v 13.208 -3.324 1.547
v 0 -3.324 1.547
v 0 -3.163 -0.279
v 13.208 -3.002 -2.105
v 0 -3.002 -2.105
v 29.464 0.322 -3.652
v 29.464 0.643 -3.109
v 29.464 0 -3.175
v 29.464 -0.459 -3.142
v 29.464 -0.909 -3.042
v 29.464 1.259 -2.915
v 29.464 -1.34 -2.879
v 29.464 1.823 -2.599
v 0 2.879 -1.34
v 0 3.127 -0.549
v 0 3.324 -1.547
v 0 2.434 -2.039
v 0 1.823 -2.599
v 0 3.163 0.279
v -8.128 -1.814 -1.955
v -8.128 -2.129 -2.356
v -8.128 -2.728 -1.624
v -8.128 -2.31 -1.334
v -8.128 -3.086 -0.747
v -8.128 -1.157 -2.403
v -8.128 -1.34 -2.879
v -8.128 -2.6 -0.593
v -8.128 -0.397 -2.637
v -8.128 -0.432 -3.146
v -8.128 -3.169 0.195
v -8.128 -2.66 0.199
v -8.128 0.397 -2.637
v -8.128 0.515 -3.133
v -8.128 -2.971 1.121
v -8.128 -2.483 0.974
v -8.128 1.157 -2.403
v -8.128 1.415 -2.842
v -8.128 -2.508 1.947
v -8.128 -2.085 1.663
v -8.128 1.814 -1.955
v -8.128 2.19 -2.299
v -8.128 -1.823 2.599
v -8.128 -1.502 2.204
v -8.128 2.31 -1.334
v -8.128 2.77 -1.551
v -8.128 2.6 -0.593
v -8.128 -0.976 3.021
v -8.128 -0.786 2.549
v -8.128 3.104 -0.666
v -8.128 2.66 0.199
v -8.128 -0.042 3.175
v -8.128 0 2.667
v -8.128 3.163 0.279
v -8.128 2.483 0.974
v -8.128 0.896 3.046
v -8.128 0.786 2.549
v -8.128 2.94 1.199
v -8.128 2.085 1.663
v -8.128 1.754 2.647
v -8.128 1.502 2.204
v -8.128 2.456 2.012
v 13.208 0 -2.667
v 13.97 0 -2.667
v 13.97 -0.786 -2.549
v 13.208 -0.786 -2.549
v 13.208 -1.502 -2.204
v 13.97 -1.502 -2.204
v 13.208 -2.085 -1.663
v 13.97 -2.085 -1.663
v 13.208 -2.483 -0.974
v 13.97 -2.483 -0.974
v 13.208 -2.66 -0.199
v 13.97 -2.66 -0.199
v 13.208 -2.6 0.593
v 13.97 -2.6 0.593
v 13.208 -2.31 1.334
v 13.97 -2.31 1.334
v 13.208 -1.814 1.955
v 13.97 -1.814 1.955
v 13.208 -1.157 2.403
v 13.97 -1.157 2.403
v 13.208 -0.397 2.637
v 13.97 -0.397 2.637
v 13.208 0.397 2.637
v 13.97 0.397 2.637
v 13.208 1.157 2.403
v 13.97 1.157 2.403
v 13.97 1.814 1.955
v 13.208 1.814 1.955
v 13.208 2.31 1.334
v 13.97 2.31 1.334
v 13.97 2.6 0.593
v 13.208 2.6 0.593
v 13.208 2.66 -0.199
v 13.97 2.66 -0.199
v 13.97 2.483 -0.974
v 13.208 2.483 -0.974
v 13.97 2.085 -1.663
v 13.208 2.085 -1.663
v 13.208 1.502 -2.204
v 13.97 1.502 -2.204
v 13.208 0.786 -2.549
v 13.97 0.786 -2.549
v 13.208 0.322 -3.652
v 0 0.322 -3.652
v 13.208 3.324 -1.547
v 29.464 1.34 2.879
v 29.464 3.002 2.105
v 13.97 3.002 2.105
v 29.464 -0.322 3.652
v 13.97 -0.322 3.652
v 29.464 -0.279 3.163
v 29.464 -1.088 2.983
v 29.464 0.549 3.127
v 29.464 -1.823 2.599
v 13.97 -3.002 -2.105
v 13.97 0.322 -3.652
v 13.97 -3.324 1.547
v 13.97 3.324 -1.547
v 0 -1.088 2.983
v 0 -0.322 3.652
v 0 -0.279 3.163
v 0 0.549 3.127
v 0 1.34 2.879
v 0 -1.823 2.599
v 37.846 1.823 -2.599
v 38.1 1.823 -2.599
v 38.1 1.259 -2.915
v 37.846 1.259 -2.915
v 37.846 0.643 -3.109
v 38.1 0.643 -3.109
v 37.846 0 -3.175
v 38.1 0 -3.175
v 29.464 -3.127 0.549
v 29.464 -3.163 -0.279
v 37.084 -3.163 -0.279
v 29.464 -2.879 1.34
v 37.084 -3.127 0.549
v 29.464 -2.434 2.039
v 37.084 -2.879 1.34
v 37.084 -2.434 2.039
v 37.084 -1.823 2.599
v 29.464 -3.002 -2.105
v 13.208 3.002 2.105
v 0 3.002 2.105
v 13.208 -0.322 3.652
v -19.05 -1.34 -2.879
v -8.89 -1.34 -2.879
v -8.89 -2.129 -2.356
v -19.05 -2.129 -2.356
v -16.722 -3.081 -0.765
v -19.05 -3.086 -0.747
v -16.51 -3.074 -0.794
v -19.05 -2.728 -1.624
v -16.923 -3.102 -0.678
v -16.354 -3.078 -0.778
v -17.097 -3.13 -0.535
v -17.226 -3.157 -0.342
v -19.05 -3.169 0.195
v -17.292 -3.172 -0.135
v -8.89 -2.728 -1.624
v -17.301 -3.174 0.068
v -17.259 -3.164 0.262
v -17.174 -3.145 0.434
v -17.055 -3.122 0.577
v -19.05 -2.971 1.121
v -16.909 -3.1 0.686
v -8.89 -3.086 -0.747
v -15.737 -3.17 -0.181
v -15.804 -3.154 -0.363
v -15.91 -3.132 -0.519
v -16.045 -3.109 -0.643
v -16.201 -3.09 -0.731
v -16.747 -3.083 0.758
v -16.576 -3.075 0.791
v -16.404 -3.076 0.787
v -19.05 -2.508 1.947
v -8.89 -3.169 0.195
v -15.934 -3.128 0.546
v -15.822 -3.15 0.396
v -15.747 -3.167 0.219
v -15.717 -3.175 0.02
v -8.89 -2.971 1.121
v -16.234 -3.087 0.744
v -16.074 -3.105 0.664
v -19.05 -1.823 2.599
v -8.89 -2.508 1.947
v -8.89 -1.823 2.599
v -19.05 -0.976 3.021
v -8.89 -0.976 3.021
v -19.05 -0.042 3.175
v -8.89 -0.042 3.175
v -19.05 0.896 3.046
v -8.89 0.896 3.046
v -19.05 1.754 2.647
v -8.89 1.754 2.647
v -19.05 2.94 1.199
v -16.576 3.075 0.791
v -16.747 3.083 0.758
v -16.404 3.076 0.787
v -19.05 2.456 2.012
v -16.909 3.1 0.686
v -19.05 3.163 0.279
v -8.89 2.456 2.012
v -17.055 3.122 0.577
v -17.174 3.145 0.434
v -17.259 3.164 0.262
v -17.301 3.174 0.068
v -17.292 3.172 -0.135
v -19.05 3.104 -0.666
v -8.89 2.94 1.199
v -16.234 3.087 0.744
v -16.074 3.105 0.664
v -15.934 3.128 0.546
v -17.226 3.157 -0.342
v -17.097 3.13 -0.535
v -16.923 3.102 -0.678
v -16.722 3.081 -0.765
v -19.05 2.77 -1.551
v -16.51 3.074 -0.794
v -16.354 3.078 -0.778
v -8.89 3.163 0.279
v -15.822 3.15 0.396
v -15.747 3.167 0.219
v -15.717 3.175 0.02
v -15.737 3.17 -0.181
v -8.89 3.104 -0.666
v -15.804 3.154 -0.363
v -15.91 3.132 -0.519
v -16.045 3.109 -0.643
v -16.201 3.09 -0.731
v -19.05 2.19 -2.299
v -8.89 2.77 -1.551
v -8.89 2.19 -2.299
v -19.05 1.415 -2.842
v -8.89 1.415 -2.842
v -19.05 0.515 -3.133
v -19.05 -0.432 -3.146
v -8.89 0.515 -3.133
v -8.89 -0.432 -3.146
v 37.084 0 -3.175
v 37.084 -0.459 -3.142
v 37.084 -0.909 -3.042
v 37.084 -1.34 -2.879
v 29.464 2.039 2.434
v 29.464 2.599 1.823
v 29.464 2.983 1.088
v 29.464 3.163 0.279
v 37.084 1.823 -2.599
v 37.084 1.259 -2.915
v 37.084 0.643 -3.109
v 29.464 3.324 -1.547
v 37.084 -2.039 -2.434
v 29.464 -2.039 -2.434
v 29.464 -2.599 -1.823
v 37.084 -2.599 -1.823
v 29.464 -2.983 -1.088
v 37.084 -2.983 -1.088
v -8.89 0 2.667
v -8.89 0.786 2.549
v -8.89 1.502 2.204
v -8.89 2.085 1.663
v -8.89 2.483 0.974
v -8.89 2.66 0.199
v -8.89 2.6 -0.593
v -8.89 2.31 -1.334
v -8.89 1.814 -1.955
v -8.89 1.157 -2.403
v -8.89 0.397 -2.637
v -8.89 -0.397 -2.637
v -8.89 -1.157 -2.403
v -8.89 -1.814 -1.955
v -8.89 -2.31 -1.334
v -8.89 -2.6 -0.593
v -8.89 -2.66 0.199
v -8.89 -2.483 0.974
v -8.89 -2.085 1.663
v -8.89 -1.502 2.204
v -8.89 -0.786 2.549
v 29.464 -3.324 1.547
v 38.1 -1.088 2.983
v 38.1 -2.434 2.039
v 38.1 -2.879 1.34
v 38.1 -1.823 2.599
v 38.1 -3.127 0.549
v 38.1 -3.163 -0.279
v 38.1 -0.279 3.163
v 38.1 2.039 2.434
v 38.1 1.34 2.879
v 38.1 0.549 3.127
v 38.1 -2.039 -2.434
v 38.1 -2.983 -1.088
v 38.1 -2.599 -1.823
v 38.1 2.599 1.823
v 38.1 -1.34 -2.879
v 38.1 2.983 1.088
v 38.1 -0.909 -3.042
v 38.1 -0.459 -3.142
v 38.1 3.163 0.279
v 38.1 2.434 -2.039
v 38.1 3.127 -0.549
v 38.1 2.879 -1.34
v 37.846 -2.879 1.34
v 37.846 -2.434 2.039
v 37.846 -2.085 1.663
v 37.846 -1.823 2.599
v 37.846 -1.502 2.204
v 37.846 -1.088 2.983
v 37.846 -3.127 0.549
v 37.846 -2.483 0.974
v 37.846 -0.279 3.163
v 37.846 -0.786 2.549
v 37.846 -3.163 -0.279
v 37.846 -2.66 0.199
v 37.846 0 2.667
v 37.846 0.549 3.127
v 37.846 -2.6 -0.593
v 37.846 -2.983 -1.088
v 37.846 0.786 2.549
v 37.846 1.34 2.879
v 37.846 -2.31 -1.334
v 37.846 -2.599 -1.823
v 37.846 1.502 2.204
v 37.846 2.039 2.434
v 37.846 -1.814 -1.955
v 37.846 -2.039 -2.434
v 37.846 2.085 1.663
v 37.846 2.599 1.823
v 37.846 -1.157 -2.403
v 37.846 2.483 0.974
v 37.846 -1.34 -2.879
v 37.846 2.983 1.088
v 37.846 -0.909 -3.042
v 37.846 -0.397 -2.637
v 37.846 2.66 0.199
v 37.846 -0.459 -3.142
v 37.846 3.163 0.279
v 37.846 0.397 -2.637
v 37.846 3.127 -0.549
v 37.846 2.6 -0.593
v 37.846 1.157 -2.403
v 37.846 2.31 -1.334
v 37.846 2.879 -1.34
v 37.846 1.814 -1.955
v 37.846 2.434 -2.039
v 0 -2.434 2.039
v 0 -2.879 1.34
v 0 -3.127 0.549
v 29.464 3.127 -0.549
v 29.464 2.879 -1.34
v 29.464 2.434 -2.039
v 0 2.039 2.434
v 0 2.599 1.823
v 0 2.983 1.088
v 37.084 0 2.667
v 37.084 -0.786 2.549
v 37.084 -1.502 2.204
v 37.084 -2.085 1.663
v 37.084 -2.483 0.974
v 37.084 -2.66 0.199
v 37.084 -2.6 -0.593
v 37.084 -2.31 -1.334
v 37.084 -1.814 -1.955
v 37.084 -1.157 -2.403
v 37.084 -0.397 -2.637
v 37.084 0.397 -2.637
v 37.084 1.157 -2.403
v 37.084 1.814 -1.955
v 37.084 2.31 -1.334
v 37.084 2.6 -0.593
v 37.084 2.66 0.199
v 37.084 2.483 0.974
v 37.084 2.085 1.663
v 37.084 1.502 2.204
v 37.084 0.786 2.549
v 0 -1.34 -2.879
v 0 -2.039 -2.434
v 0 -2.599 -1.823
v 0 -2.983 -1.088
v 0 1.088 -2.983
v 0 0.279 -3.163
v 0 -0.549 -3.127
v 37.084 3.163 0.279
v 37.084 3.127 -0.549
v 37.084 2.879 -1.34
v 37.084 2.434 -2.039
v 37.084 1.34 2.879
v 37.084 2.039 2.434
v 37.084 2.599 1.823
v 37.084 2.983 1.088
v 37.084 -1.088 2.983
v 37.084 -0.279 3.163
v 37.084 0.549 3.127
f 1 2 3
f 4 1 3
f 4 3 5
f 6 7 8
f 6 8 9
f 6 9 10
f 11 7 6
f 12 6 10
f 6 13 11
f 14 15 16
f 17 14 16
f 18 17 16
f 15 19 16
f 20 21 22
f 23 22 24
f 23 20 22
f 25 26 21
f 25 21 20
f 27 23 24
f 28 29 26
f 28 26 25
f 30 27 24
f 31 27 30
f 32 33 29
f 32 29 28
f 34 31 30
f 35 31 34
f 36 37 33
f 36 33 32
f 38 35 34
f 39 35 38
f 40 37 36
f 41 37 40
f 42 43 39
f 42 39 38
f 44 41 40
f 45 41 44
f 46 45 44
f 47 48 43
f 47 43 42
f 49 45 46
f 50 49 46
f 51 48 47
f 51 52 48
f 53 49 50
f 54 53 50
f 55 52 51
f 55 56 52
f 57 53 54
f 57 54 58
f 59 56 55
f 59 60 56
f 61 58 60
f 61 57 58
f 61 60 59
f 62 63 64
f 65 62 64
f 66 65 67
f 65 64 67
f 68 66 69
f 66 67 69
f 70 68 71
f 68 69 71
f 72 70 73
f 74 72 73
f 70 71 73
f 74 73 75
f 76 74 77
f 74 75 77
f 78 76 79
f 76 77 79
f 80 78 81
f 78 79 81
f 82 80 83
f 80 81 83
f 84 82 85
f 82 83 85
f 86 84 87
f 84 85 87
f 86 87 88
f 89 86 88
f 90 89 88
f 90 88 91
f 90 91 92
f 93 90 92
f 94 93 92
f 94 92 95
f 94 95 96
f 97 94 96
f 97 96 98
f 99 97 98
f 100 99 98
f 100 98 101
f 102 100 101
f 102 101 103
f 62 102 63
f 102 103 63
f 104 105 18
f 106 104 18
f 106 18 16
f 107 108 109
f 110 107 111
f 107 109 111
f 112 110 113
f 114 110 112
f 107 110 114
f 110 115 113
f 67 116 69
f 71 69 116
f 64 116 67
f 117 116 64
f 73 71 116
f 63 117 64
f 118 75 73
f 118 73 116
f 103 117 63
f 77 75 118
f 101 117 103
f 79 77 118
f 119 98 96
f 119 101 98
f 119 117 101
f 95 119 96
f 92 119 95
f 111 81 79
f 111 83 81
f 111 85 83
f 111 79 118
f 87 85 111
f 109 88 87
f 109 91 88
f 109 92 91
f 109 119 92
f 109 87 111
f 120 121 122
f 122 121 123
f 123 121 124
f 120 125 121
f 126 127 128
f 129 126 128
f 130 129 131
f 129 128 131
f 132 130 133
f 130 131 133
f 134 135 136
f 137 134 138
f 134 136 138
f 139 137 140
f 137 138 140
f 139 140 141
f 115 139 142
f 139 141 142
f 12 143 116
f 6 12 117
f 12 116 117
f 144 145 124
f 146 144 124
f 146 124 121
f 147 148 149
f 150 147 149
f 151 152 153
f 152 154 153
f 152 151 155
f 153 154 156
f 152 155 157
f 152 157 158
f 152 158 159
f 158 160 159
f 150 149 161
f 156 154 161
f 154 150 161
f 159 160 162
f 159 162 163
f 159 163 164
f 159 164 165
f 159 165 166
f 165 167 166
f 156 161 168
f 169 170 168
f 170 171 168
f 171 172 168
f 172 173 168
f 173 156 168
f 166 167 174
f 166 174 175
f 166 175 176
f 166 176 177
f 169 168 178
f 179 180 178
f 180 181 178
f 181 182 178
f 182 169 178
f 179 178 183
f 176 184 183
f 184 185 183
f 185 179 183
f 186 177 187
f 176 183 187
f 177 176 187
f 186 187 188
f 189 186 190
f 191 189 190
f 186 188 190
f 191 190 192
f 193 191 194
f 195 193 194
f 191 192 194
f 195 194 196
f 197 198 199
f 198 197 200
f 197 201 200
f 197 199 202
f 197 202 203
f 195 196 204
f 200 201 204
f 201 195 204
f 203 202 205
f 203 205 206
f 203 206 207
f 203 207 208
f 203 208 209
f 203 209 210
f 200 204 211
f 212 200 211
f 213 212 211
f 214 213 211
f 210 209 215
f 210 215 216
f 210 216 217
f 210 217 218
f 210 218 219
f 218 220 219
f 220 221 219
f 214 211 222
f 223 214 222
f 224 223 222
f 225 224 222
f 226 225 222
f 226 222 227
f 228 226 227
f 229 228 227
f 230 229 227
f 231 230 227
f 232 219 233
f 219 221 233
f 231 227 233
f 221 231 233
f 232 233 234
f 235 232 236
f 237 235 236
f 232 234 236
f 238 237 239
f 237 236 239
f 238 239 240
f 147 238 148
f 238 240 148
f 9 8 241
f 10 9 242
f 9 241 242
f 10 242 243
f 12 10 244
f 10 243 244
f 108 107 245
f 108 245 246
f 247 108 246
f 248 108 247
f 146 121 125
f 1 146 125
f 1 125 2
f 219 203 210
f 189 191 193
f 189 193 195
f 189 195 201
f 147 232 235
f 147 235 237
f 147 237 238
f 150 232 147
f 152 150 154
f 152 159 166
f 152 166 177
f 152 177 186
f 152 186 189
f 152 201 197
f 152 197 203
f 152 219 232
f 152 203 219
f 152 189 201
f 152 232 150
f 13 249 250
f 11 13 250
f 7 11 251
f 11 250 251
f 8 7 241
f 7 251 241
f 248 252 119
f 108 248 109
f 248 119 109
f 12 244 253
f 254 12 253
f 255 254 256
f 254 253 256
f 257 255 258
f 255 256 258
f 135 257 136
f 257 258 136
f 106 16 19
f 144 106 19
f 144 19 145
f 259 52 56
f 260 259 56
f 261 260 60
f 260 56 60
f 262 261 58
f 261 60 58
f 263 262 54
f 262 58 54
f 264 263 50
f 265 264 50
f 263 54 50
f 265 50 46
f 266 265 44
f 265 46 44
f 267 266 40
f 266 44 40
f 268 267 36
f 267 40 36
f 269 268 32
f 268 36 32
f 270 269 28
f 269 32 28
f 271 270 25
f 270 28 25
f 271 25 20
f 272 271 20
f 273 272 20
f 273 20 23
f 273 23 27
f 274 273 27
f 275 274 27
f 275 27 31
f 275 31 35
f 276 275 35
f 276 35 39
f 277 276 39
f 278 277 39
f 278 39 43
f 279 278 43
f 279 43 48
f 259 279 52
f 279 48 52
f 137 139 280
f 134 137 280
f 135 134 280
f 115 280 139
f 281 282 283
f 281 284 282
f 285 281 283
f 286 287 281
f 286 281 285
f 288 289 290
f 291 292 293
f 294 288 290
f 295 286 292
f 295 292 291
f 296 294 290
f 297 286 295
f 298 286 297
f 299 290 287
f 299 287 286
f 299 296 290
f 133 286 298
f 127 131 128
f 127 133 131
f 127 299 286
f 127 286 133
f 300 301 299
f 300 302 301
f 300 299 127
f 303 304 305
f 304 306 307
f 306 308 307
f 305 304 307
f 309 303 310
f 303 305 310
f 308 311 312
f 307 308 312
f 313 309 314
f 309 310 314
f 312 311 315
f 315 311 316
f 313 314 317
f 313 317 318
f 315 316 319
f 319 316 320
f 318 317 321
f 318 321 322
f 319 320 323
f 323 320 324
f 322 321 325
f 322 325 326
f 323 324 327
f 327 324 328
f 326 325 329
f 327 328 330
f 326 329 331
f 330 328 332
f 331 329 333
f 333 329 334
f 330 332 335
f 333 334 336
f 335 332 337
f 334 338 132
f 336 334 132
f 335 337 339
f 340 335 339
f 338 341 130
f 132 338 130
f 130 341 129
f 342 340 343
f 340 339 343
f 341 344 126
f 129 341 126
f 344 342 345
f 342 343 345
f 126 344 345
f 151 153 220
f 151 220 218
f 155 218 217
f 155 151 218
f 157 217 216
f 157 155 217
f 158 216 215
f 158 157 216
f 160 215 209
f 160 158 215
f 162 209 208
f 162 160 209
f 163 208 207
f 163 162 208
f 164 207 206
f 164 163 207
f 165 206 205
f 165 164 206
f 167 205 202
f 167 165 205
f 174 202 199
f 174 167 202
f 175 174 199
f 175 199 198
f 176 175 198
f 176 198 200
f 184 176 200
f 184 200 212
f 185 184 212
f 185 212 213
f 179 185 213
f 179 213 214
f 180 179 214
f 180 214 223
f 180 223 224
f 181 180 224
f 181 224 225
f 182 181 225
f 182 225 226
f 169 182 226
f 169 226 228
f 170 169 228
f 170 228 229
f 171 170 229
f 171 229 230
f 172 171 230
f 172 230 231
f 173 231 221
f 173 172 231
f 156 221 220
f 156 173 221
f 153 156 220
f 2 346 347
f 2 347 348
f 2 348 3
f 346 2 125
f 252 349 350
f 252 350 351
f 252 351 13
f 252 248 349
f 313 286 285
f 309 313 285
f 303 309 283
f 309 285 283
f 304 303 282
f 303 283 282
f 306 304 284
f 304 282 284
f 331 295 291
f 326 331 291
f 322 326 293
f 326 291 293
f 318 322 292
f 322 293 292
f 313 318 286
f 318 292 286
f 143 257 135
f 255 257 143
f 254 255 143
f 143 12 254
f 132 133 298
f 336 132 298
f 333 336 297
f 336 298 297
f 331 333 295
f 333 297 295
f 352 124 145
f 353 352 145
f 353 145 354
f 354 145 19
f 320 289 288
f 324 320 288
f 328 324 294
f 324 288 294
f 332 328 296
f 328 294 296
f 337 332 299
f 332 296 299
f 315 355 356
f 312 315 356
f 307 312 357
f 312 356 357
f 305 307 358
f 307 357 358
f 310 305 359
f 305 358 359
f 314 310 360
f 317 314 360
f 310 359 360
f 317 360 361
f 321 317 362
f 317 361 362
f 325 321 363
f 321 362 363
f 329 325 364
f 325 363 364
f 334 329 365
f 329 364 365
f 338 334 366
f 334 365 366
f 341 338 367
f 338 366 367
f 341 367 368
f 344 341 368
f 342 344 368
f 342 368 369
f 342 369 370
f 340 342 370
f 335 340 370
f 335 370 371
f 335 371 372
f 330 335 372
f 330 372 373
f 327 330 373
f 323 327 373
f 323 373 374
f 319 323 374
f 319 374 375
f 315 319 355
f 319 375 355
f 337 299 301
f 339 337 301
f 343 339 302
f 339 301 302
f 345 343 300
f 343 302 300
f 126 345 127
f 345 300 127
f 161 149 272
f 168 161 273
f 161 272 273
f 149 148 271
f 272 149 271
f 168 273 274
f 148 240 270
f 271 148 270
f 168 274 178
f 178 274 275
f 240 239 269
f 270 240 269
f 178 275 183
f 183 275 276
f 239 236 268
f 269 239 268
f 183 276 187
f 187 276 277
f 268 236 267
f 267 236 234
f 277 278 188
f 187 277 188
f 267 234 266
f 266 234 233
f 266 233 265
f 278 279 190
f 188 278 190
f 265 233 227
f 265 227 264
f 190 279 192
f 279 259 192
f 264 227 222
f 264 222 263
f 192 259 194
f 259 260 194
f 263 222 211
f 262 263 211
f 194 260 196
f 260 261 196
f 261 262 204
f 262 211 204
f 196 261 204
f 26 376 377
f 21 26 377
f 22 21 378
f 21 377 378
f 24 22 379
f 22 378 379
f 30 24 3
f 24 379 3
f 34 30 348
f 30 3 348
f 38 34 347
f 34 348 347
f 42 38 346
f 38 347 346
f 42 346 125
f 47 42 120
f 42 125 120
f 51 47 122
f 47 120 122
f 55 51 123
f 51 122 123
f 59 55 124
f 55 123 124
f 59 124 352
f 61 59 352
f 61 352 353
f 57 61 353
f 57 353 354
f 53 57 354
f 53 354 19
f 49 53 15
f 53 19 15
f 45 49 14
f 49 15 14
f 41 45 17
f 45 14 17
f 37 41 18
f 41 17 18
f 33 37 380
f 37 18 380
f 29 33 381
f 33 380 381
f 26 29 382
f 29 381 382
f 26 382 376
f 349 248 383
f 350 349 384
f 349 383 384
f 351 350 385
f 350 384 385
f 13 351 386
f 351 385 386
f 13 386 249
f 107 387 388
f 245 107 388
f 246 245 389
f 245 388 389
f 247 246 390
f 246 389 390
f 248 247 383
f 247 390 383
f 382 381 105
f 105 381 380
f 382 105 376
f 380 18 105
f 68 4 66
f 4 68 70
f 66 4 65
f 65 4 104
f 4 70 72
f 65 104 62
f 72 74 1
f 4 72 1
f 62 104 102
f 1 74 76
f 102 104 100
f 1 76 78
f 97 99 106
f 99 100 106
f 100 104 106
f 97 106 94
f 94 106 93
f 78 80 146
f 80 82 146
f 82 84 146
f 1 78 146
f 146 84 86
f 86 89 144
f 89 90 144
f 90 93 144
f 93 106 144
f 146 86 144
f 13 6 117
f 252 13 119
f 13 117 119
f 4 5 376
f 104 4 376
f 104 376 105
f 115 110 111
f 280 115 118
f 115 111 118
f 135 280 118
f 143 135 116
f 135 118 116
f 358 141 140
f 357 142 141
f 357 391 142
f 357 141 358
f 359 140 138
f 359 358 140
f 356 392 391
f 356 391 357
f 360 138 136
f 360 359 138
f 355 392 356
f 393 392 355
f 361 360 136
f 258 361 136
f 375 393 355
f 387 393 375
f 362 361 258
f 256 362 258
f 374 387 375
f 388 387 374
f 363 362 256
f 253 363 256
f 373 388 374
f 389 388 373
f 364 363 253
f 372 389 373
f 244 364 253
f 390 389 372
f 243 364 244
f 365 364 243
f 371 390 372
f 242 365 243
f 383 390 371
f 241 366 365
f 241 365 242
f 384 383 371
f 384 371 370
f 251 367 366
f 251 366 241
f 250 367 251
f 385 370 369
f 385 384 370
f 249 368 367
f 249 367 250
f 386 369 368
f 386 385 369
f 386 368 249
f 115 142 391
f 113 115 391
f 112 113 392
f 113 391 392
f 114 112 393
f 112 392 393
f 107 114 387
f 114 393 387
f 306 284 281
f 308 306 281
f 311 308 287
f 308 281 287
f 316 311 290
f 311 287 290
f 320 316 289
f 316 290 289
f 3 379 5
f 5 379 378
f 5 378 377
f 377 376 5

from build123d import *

# Parameters (mm, degrees)
BOSS_EXTRUDE1_DEPTH     = 38.1
SKETCH3_R               = 3.175
BOSS_EXTRUDE3_DEPTH     = 19.05
CUT_EXTRUDE1_DEPTH      = 39.418677326
CUT_EXTRUDE1_DEPTH_BACK = 39.418677326
SKETCH4_R               = 0.79375
CUT_EXTRUDE4_DEPTH      = 8.636
SKETCH6_OUTSIDE_W       = 20.904
SKETCH6_OUTSIDE_H       = 20.248
SKETCH6_OUTSIDE_R       = 2.667
CUT_EXTRUDE5_DEPTH      = 0.762
SKETCH9_OUTSIDE_W       = 20.904
SKETCH9_OUTSIDE_H       = 20.248
SKETCH9_OUTSIDE_R       = 2.667
CUT_EXTRUDE6_DEPTH      = 0.762
SKETCH10_OUTSIDE_W      = 20.904
SKETCH10_OUTSIDE_H      = 20.248
SKETCH10_OUTSIDE_R      = 2.667
CUT_EXTRUDE7_DEPTH      = 0.762


with BuildPart() as part:
    # Sketch1 → Boss-Extrude1 (new body)
    with BuildSketch(Plane(origin=(0, 0, 0), x_dir=(0, 0, -1), z_dir=(1, 0, 0))):
        Polygon((2.105028301, -3.00161443), (3.651988499, 0.32220077), (1.546960198, 3.323815199), (-2.105028301, 3.00161443), (-3.651988499, -0.32220077), (-1.546960198, -3.323815199), align=None)
    extrude(amount=BOSS_EXTRUDE1_DEPTH)

    # Sketch3 → Boss-Extrude3 (add)
    with BuildSketch(Plane.ZY):
        with Locations(Location((0, 0, 0), (0, 0, 204.958070598))):
            Circle(SKETCH3_R)
    extrude(amount=BOSS_EXTRUDE3_DEPTH)

    # Sketch4 → Cut-Extrude1 (cut, two sides: drawn at the far end of the back side and taken through both)
    with BuildSketch(Plane(origin=(0, 0, 0), x_dir=(1, 0, 0), z_dir=(0, 1, 0)).offset(-CUT_EXTRUDE1_DEPTH_BACK)):
        with Locations(Location((-16.51, 0, 0), (0, 0, 90))):
            Circle(SKETCH4_R)
    extrude(amount=CUT_EXTRUDE1_DEPTH + CUT_EXTRUDE1_DEPTH_BACK, mode=Mode.SUBTRACT)

    # Sketch5 → Cut-Extrude4 (cut)
    with BuildSketch(Plane(origin=(38.1, 0, 0), x_dir=(0, 0, -1), z_dir=(1, 0, 0))):
        with BuildLine():
            Line((-2.878508392, 1.339706848), (-2.105028301, 3.00161443))
            ThreePointArc((-2.105028301, 3.00161443), (-3.323815199, 1.546960198), (-3.651988499, -0.32220077))
            Line((-3.651988499, -0.32220077), (-2.878508392, 1.339706848))
        make_face()
        with BuildLine():
            Line((-2.878508392, 1.339706848), (-3.651988499, -0.32220077))
            Line((-3.651988499, -0.32220077), (-2.599474334, -1.823008005))
            ThreePointArc((-2.599474334, -1.823008005), (-3.162714814, -0.279034054), (-2.878508392, 1.339706848))
        make_face()
        with BuildLine():
            ThreePointArc((-3.651988499, -0.32220077), (-3.00161443, -2.105028301), (-1.546960198, -3.323815199))
            Line((-1.546960198, -3.323815199), (-2.599474334, -1.823008005))
            Line((-2.599474334, -1.823008005), (-3.651988499, -0.32220077))
        make_face()
        with BuildLine():
            Line((-2.599474334, -1.823008005), (-1.546960198, -3.323815199))
            Line((-1.546960198, -3.323815199), (0.279034067, -3.162714813))
            ThreePointArc((0.279034067, -3.162714813), (-1.339706811, -2.878508409), (-2.599474334, -1.823008005))
        make_face()
        with BuildLine():
            ThreePointArc((-1.546960198, -3.323815199), (0.32220077, -3.651988499), (2.105028301, -3.00161443))
            Line((2.105028301, -3.00161443), (0.279034067, -3.162714813))
            Line((0.279034067, -3.162714813), (-1.546960198, -3.323815199))
        make_face()
        with BuildLine():
            Line((0.279034067, -3.162714813), (2.105028301, -3.00161443))
            Line((2.105028301, -3.00161443), (2.878508392, -1.339706848))
            ThreePointArc((2.878508392, -1.339706848), (1.823007983, -2.59947435), (0.279034067, -3.162714813))
        make_face()
        with BuildLine():
            ThreePointArc((2.105028301, -3.00161443), (3.252555442, -1.69166085), (3.666174209, 0))
            ThreePointArc((3.666174209, 0), (3.662626065, 0.16125645), (3.651988499, 0.32220077))
            Line((3.651988499, 0.32220077), (2.878508392, -1.339706848))
            Line((2.878508392, -1.339706848), (2.105028301, -3.00161443))
        make_face()
        with BuildLine():
            Line((2.878508392, -1.339706848), (3.651988499, 0.32220077))
            Line((3.651988499, 0.32220077), (2.599474407, 1.823007901))
            ThreePointArc((2.599474407, 1.823007901), (3.027701789, 0.955848774), (3.175, 0))
            ThreePointArc((3.175, 0), (3.09999106, -0.686061534), (2.878508392, -1.339706848))
        make_face()
        with BuildLine():
            Line((2.599474407, 1.823007901), (3.651988499, 0.32220077))
            ThreePointArc((3.651988499, 0.32220077), (3.00161443, 2.105028301), (1.546960198, 3.323815199))
            Line((1.546960198, 3.323815199), (2.599474407, 1.823007901))
        make_face()
        with BuildLine():
            Line((2.599474407, 1.823007901), (1.546960198, 3.323815199))
            Line((1.546960198, 3.323815199), (-0.279034067, 3.162714813))
            ThreePointArc((-0.279034067, 3.162714813), (1.339706869, 2.878508382), (2.599474407, 1.823007901))
        make_face()
        with BuildLine():
            Line((-0.279034067, 3.162714813), (1.546960198, 3.323815199))
            ThreePointArc((1.546960198, 3.323815199), (-0.32220077, 3.651988499), (-2.105028301, 3.00161443))
            Line((-2.105028301, 3.00161443), (-0.279034067, 3.162714813))
        make_face()
        with BuildLine():
            Line((-0.279034067, 3.162714813), (-2.105028301, 3.00161443))
            Line((-2.105028301, 3.00161443), (-2.878508392, 1.339706848))
            ThreePointArc((-2.878508392, 1.339706848), (-1.823007983, 2.59947435), (-0.279034067, 3.162714813))
        make_face()
    extrude(amount=-CUT_EXTRUDE4_DEPTH, mode=Mode.SUBTRACT)

    # Sketch6 outside → Cut-Extrude5 (cut)
    with BuildSketch(Plane(origin=(37.084, 0, 0), x_dir=(0, 0, -1), z_dir=(1, 0, 0))):
        Rectangle(SKETCH6_OUTSIDE_W, SKETCH6_OUTSIDE_H)
        with Locations(Location((0, 0, 0), (0, 0, 180))):
            Circle(SKETCH6_OUTSIDE_R, mode=Mode.SUBTRACT)
    extrude(amount=CUT_EXTRUDE5_DEPTH, mode=Mode.SUBTRACT)

    # Sketch9 outside → Cut-Extrude6 (cut)
    with BuildSketch(Plane.ZY.offset(8.128)):
        Rectangle(SKETCH9_OUTSIDE_W, SKETCH9_OUTSIDE_H)
        Circle(SKETCH9_OUTSIDE_R, mode=Mode.SUBTRACT)
    extrude(amount=CUT_EXTRUDE6_DEPTH, mode=Mode.SUBTRACT)

    # Sketch10 outside → Cut-Extrude7 (cut)
    with BuildSketch(Plane.ZY.offset(-13.97)):
        Rectangle(SKETCH10_OUTSIDE_W, SKETCH10_OUTSIDE_H)
        with Locations(Location((0, 0, 0), (0, 0, 180))):
            Circle(SKETCH10_OUTSIDE_R, mode=Mode.SUBTRACT)
    extrude(amount=CUT_EXTRUDE7_DEPTH, mode=Mode.SUBTRACT)


solid = part.part
